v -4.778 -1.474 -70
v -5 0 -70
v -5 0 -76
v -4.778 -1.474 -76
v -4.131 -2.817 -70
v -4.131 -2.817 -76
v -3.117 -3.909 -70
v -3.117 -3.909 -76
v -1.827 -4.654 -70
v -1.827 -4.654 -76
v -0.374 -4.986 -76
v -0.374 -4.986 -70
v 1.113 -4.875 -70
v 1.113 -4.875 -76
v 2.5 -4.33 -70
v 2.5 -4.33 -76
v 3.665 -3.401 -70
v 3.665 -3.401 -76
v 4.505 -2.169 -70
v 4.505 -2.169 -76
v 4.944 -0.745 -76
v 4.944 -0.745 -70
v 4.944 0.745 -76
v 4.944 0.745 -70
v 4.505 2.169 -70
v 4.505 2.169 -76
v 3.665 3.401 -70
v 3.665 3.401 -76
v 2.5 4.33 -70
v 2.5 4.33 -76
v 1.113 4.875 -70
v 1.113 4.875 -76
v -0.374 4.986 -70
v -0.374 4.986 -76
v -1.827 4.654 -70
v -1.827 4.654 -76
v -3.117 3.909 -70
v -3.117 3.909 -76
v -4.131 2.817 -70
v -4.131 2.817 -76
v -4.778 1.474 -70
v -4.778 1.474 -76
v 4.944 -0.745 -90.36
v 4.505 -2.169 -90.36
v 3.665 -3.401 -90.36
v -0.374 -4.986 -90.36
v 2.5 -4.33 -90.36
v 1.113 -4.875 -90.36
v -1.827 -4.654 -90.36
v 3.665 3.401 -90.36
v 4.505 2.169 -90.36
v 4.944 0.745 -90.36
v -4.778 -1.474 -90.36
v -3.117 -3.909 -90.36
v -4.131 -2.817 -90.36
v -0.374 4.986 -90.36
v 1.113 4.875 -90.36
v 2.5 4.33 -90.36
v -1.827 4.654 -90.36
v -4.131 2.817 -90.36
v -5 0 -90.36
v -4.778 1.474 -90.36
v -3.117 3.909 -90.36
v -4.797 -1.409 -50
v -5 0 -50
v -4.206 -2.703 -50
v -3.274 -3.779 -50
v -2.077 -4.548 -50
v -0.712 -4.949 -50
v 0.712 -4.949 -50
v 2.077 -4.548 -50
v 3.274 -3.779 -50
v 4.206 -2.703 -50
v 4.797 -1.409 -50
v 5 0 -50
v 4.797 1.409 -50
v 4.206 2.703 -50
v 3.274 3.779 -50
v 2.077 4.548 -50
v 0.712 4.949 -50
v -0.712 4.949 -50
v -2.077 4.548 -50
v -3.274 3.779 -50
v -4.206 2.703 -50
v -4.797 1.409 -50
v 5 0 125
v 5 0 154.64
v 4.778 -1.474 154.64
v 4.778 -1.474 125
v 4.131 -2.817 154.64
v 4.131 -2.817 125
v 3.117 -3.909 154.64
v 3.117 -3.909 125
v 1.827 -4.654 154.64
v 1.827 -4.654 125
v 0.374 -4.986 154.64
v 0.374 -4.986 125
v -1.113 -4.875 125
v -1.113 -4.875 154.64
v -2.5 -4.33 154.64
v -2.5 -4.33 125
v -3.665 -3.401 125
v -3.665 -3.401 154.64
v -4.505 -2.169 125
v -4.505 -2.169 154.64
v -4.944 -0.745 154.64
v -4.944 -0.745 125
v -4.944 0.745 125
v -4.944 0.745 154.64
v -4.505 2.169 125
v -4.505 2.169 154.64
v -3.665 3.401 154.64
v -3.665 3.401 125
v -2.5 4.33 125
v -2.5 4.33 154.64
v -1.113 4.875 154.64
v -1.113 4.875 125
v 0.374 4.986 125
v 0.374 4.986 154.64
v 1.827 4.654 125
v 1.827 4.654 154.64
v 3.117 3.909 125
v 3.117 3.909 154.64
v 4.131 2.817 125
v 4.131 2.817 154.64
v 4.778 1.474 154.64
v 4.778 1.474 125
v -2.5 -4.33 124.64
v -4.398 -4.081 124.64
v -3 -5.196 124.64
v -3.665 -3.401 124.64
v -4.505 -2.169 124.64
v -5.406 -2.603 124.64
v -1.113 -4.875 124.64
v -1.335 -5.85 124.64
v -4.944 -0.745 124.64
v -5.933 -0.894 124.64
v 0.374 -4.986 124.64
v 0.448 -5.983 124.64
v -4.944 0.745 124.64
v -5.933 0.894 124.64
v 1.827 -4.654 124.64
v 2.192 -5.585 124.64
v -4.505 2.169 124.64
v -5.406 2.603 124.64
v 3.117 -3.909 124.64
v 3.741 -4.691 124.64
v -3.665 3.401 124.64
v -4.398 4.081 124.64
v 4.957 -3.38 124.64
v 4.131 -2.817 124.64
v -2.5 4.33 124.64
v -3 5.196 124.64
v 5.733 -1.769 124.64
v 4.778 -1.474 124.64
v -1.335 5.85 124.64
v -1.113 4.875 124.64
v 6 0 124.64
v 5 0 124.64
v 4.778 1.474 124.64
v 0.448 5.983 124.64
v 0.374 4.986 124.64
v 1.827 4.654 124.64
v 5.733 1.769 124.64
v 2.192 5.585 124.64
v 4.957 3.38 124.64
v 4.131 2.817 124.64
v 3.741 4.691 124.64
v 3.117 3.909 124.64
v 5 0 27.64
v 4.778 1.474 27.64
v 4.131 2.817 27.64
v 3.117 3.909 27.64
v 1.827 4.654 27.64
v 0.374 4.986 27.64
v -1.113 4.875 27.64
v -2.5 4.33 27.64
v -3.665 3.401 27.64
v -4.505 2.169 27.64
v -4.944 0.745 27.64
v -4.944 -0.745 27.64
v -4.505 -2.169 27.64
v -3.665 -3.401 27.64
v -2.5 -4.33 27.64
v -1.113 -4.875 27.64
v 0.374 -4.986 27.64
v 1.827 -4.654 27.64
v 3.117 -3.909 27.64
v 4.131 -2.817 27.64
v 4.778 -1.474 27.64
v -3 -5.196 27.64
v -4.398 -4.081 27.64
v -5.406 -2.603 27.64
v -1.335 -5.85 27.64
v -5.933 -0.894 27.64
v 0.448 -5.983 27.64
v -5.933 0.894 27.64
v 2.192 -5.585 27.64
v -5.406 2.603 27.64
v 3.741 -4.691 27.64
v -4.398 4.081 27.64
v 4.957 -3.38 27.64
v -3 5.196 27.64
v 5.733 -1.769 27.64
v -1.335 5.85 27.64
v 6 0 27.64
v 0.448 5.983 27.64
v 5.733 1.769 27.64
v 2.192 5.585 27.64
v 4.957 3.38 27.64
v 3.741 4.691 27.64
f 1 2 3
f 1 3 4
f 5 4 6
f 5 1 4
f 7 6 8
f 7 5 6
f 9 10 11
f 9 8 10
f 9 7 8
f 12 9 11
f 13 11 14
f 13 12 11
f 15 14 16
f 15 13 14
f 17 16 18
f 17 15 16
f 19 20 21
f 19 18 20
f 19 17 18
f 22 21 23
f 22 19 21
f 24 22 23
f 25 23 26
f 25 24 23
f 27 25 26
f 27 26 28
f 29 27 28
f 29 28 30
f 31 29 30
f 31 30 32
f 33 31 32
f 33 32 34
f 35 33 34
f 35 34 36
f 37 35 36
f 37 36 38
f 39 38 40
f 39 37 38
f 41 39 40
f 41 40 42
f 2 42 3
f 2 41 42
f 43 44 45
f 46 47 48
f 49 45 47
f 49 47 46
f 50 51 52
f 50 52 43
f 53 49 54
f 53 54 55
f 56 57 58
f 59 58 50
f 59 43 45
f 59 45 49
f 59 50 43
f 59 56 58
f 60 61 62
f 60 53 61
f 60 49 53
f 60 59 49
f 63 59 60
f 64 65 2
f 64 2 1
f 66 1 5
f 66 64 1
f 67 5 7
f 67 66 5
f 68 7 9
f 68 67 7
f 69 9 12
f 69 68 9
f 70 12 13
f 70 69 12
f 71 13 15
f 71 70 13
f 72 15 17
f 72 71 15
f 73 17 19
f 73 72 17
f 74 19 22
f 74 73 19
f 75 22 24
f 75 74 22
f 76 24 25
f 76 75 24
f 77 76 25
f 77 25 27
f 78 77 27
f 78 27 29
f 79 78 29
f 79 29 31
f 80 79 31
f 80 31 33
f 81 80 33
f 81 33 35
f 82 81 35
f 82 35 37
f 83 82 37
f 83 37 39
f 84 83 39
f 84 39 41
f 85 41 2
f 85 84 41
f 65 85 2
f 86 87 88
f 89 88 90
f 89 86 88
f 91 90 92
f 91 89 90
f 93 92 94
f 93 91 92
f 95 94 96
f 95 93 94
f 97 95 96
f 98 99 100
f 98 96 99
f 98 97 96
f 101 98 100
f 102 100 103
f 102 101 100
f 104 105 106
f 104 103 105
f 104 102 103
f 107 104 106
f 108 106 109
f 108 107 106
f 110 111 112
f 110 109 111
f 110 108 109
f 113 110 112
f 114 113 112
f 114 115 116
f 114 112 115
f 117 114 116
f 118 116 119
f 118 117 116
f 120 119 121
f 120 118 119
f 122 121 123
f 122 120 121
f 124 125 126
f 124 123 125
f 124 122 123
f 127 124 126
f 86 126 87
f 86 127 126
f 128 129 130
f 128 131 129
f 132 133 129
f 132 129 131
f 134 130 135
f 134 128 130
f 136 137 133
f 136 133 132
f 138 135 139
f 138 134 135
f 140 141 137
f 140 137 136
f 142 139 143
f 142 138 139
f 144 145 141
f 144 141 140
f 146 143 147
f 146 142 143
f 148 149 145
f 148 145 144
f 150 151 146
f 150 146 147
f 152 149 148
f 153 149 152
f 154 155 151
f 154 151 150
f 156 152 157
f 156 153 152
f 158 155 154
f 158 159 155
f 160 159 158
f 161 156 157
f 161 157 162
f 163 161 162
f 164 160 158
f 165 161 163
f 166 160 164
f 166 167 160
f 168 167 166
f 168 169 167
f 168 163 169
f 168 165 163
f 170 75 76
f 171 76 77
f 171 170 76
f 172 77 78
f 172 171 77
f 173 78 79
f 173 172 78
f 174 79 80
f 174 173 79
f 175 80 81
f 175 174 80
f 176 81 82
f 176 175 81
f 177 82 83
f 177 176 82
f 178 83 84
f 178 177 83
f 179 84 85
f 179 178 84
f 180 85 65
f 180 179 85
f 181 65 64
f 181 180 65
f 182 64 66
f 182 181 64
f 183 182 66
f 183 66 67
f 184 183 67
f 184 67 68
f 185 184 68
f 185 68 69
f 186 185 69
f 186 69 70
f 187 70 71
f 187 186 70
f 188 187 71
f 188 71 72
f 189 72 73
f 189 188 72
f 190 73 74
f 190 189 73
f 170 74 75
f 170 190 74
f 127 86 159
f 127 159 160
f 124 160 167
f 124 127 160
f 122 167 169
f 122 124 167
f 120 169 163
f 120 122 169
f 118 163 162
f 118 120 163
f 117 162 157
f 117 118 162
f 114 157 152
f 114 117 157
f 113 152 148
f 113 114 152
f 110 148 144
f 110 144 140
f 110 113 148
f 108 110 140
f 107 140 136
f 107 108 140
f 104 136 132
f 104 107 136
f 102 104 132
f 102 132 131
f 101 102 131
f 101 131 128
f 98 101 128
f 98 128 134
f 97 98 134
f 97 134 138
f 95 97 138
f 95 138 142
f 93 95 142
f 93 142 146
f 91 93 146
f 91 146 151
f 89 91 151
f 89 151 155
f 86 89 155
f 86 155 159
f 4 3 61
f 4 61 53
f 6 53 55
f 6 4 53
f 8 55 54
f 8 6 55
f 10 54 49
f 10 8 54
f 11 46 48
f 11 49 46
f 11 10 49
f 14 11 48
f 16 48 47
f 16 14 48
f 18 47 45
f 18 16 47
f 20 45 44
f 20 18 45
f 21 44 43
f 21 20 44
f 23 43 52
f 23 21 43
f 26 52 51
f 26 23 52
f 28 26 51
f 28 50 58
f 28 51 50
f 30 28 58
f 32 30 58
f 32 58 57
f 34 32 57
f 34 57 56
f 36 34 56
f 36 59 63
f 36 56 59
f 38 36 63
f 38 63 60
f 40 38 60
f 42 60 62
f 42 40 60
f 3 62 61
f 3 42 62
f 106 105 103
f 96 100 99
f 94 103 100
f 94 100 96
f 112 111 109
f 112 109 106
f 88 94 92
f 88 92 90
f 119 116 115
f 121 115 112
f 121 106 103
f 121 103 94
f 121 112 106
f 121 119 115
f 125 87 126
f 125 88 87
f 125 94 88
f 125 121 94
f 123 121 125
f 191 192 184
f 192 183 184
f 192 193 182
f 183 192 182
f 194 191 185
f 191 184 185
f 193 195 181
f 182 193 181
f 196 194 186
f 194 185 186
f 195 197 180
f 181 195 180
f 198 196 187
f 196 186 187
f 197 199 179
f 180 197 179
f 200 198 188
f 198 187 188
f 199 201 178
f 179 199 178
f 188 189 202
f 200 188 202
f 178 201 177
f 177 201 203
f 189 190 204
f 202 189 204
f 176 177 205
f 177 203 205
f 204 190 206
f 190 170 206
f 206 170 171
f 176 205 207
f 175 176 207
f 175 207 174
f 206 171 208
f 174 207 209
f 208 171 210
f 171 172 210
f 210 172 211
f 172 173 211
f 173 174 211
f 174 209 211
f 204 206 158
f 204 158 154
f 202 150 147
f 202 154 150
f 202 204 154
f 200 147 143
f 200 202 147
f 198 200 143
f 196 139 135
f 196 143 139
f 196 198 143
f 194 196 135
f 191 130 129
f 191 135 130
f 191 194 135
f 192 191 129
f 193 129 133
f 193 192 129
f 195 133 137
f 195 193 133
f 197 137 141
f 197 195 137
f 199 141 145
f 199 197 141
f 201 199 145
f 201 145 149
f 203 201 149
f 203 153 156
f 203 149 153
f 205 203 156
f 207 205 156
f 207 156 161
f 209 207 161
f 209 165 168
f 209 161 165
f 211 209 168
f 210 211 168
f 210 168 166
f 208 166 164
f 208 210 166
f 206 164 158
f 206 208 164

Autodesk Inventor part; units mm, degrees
ref_plane "YZ Plane" through (0, 0, 0) normal (1, 0, 0) x (0, 1, 0)
sketch "Sketch1" plane through (0, 0, 0) normal (0, 0, 1) x (1, 0, 0)
  circle A0 centre (0, 0) radius 7.5 projected
  circle A1 centre (0, 0) radius 5.5 projected
  circle A2 centre (0, 0) radius 5 projected
extrude "Extrusion1" add sketch "Sketch1" against normal blind 50 contours A2
sketch "Sketch2" plane through (0, 0, 0) normal (0, 0, 1) x (1, 0, 0)
  point P0 (0, 0)
sketch "Sketch3" plane through (0, 0, 0) normal (0, 0, 1) x (1, 0, 0)
  circle A0 centre (0, 0) radius 5 projected
extrude "Extrusion2" add sketch "Sketch3" along normal blind 150
sketch "Sketch4" plane through (0, 0, 150) normal (0, 0, 1) x (1, 0, 0)
  circle A0 centre (0, 0) radius 5 projected
  circle A1 centre (0, 0) radius 4
  dimension "d4" = 8
extrude "Extrusion3" cut sketch "Sketch4" against normal blind 30
sketch "Sketch5" plane through (0, 0, -50) normal (0, 0, -1) x (-1, 0, 0)
  circle A0 centre (0, 0) radius 5 projected
extrude "Extrusion4" add sketch "Sketch5" along normal blind 20
sketch "Szkic6" plane through (0, 0, -70) normal (0, 0, -1) x (-1, 0, 0)
  circle A0 centre (0, 0) radius 4 projected
  circle A1 centre (0, 0) radius 5
extrude "Wyciągnięcie proste5" add sketch "Szkic6" along normal blind 6 contours A0 | A1
sketch "Szkic7" plane through (0, 0, 150) normal (0, 0, 1) x (1, 0, 0)
  circle A0 centre (0, 0) radius 5 projected
  circle A1 centre (0, 0) radius 5 projected
ref_plane "Płaszczyzna konstrukcyjna1" through (-9.4999, -9.4999, 27.64) normal (0, 0, 1) x (0.8774, -0.4797, 0)
extrude "Wyciągnięcie proste6" cut sketch "Szkic7" against normal up to surface (122.36 mm away)
sketch "Szkic8" plane through (0, 0, 27.64) normal (0, 0, 1) x (1, 0, 0)
  circle A0 centre (0, 0) radius 5 projected
  circle A1 centre (0, 0) radius 4.4644
  point P0 (0, 0)
extrude "Wyciągnięcie proste7" add sketch "Szkic8" along normal blind 2 contours A1
sketch "Szkic9" plane through (0, 0, 29.64) normal (0, 0, 1) x (1, 0, 0)
  circle A0 centre (0, 0) radius 4.4644 projected
  circle A1 centre (0, 0) radius 5 projected
  point P0 (0, 0)
ref_plane "Płaszczyzna konstrukcyjna2" through (-6.6123, -6.6123, 155) normal (0, 0, -1) x (-0.1077, 0.9942, 0)
extrude "Wyciągnięcie proste8" add sketch "Szkic9" along normal up to surface (125.36 mm away) contours A0 | A1
sketch "Szkic10" plane through (0, 0, -76) normal (0, 0, -1) x (-1, 0, 0)
  circle A0 centre (0, 0) radius 5 projected
  point P0 (0, 0)
extrude "Wyciągnięcie proste9" add sketch "Szkic10" along normal blind 15
sketch "Szkic11" plane through (0, 0, 27.64) normal (0, 0, 1) x (1, 0, 0)
  circle A0 centre (0, 0) radius 5 projected
  circle A1 centre (0, 0) radius 4.4644 projected
  circle A2 centre (0, 0) radius 6
  point P0 (0, 0)
  dimension "d19" = 12
extrude "Wyciągnięcie proste10" add sketch "Szkic11" along normal blind 97.36 contours A0 | A1 | A2
sketch "Szkic12" plane through (0, 0, -91) normal (0, 0, -1) x (-1, 0, 0)
  circle A0 centre (0, 0) radius 5 projected
  point P0 (0, 0)
extrude "Wyciągnięcie proste11" cut sketch "Szkic12" against normal blind 0.6
sketch "Szkic13" plane through (0, 0, -90.4) normal (0, 0, -1) x (-1, 0, 0)
  circle A0 centre (0, 0) radius 5 projected
extrude "Wyciągnięcie proste12" cut sketch "Szkic13" against normal blind 0.04
sketch "Szkic14" plane through (0, 0, 125) normal (0, 0, 1) x (1, 0, 0)
  circle A0 centre (0, 0) radius 6 projected
  circle A1 centre (0, 0) radius 5 projected
  point P0 (0, 0)
extrude "Wyciągnięcie proste13" cut sketch "Szkic14" against normal blind 0.36
sketch "Szkic15" plane through (0, 0, 155) normal (0, 0, 1) x (1, 0, 0)
  circle A0 centre (0, 0) radius 5 projected
  point P0 (0, 0)
extrude "Wyciągnięcie proste14" cut sketch "Szkic15" against normal blind 0.36
properties part number "os_napedowa"
